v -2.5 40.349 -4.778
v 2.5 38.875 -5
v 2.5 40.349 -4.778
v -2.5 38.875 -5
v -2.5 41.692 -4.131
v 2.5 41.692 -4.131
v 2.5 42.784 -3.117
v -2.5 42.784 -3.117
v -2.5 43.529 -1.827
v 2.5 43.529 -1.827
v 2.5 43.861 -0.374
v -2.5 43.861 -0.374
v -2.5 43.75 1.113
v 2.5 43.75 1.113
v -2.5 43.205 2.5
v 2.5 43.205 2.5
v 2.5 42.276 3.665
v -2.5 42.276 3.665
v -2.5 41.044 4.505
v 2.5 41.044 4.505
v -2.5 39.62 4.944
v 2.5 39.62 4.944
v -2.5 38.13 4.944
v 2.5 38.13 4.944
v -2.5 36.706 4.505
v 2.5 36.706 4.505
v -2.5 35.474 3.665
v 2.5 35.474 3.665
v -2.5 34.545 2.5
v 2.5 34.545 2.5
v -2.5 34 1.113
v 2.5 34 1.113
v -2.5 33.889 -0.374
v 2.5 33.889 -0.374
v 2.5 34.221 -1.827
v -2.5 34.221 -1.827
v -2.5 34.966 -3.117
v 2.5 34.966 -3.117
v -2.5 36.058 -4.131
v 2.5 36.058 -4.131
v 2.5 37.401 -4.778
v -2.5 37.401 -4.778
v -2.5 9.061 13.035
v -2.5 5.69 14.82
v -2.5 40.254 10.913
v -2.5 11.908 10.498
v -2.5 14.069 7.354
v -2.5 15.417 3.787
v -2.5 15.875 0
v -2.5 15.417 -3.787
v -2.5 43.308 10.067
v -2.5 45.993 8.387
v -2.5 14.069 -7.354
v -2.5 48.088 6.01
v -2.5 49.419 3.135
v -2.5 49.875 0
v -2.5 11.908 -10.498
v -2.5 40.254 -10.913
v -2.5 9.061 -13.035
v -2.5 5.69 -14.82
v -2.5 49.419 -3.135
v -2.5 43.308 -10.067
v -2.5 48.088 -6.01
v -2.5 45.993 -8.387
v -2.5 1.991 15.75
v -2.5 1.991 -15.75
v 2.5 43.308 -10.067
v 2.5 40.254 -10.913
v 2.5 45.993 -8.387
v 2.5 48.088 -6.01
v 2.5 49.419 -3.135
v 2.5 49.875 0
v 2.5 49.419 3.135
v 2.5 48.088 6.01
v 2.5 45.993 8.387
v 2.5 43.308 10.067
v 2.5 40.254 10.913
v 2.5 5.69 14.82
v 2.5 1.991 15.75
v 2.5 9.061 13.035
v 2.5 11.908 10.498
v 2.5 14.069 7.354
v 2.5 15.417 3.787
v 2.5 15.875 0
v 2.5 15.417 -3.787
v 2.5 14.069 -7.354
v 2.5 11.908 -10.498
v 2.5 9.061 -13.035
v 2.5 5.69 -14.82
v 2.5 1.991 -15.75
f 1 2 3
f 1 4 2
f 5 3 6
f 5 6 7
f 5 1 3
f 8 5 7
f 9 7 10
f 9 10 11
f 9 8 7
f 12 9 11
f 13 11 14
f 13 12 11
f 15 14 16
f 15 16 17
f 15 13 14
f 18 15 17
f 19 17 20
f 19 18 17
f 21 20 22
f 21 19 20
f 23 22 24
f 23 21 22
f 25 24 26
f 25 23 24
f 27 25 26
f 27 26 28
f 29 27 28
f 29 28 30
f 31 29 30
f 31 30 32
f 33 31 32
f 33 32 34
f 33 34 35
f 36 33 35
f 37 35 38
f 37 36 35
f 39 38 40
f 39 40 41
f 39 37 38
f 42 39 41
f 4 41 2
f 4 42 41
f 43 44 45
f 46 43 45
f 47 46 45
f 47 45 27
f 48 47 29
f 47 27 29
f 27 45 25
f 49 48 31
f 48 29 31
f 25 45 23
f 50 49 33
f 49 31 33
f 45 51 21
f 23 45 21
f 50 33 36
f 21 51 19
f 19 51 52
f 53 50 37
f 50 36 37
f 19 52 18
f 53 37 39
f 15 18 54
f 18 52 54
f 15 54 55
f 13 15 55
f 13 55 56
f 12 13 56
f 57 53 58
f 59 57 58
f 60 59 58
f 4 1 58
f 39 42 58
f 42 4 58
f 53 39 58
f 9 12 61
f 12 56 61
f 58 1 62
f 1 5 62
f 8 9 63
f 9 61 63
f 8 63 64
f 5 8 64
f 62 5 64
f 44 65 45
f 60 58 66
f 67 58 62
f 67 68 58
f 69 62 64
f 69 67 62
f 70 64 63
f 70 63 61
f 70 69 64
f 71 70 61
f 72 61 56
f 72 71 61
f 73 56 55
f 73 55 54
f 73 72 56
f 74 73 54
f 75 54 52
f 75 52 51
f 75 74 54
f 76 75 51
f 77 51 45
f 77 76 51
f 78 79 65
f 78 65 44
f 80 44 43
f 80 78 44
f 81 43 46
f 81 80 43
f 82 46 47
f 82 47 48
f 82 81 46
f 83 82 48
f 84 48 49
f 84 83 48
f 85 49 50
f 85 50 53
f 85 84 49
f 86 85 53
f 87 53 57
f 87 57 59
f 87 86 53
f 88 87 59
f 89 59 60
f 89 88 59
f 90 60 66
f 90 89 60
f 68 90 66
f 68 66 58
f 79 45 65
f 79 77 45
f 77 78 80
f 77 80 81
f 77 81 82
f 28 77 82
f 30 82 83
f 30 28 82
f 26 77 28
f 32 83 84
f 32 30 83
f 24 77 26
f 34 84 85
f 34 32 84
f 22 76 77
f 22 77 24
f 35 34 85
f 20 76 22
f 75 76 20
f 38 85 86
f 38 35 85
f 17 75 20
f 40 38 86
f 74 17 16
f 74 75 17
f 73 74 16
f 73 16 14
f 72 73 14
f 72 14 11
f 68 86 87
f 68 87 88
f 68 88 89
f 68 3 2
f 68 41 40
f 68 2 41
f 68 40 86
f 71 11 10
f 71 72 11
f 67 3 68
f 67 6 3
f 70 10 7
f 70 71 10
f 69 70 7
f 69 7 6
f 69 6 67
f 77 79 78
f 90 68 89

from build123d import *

# Parameters (mm, degrees)
SKETCH2_R           = 5
BOSS_EXTRUDE1_DEPTH = 2.5


with BuildPart() as part:
    # Sketch2 → Boss-Extrude1 (new, symmetric)
    with BuildSketch(Plane(origin=(0, 0, 0), x_dir=(0, 0, -1), z_dir=(1, 0, 0))):
        with BuildLine():
            Line((-10.913166227, 40.254421222), (-15.749683077, 1.990755627))
            ThreePointArc((-15.749683077, 1.990755627), (0, 15.875), (15.749683077, 1.990755627))
            Line((15.749683077, 1.990755627), (10.913166227, 40.254421222))
            ThreePointArc((10.913166227, 40.254421222), (0, 49.875), (-10.913166227, 40.254421222))
        make_face()
        with Locations((0, 38.875)):
            Circle(SKETCH2_R, mode=Mode.SUBTRACT)
    extrude(amount=BOSS_EXTRUDE1_DEPTH, both=True)


solid = part.part
